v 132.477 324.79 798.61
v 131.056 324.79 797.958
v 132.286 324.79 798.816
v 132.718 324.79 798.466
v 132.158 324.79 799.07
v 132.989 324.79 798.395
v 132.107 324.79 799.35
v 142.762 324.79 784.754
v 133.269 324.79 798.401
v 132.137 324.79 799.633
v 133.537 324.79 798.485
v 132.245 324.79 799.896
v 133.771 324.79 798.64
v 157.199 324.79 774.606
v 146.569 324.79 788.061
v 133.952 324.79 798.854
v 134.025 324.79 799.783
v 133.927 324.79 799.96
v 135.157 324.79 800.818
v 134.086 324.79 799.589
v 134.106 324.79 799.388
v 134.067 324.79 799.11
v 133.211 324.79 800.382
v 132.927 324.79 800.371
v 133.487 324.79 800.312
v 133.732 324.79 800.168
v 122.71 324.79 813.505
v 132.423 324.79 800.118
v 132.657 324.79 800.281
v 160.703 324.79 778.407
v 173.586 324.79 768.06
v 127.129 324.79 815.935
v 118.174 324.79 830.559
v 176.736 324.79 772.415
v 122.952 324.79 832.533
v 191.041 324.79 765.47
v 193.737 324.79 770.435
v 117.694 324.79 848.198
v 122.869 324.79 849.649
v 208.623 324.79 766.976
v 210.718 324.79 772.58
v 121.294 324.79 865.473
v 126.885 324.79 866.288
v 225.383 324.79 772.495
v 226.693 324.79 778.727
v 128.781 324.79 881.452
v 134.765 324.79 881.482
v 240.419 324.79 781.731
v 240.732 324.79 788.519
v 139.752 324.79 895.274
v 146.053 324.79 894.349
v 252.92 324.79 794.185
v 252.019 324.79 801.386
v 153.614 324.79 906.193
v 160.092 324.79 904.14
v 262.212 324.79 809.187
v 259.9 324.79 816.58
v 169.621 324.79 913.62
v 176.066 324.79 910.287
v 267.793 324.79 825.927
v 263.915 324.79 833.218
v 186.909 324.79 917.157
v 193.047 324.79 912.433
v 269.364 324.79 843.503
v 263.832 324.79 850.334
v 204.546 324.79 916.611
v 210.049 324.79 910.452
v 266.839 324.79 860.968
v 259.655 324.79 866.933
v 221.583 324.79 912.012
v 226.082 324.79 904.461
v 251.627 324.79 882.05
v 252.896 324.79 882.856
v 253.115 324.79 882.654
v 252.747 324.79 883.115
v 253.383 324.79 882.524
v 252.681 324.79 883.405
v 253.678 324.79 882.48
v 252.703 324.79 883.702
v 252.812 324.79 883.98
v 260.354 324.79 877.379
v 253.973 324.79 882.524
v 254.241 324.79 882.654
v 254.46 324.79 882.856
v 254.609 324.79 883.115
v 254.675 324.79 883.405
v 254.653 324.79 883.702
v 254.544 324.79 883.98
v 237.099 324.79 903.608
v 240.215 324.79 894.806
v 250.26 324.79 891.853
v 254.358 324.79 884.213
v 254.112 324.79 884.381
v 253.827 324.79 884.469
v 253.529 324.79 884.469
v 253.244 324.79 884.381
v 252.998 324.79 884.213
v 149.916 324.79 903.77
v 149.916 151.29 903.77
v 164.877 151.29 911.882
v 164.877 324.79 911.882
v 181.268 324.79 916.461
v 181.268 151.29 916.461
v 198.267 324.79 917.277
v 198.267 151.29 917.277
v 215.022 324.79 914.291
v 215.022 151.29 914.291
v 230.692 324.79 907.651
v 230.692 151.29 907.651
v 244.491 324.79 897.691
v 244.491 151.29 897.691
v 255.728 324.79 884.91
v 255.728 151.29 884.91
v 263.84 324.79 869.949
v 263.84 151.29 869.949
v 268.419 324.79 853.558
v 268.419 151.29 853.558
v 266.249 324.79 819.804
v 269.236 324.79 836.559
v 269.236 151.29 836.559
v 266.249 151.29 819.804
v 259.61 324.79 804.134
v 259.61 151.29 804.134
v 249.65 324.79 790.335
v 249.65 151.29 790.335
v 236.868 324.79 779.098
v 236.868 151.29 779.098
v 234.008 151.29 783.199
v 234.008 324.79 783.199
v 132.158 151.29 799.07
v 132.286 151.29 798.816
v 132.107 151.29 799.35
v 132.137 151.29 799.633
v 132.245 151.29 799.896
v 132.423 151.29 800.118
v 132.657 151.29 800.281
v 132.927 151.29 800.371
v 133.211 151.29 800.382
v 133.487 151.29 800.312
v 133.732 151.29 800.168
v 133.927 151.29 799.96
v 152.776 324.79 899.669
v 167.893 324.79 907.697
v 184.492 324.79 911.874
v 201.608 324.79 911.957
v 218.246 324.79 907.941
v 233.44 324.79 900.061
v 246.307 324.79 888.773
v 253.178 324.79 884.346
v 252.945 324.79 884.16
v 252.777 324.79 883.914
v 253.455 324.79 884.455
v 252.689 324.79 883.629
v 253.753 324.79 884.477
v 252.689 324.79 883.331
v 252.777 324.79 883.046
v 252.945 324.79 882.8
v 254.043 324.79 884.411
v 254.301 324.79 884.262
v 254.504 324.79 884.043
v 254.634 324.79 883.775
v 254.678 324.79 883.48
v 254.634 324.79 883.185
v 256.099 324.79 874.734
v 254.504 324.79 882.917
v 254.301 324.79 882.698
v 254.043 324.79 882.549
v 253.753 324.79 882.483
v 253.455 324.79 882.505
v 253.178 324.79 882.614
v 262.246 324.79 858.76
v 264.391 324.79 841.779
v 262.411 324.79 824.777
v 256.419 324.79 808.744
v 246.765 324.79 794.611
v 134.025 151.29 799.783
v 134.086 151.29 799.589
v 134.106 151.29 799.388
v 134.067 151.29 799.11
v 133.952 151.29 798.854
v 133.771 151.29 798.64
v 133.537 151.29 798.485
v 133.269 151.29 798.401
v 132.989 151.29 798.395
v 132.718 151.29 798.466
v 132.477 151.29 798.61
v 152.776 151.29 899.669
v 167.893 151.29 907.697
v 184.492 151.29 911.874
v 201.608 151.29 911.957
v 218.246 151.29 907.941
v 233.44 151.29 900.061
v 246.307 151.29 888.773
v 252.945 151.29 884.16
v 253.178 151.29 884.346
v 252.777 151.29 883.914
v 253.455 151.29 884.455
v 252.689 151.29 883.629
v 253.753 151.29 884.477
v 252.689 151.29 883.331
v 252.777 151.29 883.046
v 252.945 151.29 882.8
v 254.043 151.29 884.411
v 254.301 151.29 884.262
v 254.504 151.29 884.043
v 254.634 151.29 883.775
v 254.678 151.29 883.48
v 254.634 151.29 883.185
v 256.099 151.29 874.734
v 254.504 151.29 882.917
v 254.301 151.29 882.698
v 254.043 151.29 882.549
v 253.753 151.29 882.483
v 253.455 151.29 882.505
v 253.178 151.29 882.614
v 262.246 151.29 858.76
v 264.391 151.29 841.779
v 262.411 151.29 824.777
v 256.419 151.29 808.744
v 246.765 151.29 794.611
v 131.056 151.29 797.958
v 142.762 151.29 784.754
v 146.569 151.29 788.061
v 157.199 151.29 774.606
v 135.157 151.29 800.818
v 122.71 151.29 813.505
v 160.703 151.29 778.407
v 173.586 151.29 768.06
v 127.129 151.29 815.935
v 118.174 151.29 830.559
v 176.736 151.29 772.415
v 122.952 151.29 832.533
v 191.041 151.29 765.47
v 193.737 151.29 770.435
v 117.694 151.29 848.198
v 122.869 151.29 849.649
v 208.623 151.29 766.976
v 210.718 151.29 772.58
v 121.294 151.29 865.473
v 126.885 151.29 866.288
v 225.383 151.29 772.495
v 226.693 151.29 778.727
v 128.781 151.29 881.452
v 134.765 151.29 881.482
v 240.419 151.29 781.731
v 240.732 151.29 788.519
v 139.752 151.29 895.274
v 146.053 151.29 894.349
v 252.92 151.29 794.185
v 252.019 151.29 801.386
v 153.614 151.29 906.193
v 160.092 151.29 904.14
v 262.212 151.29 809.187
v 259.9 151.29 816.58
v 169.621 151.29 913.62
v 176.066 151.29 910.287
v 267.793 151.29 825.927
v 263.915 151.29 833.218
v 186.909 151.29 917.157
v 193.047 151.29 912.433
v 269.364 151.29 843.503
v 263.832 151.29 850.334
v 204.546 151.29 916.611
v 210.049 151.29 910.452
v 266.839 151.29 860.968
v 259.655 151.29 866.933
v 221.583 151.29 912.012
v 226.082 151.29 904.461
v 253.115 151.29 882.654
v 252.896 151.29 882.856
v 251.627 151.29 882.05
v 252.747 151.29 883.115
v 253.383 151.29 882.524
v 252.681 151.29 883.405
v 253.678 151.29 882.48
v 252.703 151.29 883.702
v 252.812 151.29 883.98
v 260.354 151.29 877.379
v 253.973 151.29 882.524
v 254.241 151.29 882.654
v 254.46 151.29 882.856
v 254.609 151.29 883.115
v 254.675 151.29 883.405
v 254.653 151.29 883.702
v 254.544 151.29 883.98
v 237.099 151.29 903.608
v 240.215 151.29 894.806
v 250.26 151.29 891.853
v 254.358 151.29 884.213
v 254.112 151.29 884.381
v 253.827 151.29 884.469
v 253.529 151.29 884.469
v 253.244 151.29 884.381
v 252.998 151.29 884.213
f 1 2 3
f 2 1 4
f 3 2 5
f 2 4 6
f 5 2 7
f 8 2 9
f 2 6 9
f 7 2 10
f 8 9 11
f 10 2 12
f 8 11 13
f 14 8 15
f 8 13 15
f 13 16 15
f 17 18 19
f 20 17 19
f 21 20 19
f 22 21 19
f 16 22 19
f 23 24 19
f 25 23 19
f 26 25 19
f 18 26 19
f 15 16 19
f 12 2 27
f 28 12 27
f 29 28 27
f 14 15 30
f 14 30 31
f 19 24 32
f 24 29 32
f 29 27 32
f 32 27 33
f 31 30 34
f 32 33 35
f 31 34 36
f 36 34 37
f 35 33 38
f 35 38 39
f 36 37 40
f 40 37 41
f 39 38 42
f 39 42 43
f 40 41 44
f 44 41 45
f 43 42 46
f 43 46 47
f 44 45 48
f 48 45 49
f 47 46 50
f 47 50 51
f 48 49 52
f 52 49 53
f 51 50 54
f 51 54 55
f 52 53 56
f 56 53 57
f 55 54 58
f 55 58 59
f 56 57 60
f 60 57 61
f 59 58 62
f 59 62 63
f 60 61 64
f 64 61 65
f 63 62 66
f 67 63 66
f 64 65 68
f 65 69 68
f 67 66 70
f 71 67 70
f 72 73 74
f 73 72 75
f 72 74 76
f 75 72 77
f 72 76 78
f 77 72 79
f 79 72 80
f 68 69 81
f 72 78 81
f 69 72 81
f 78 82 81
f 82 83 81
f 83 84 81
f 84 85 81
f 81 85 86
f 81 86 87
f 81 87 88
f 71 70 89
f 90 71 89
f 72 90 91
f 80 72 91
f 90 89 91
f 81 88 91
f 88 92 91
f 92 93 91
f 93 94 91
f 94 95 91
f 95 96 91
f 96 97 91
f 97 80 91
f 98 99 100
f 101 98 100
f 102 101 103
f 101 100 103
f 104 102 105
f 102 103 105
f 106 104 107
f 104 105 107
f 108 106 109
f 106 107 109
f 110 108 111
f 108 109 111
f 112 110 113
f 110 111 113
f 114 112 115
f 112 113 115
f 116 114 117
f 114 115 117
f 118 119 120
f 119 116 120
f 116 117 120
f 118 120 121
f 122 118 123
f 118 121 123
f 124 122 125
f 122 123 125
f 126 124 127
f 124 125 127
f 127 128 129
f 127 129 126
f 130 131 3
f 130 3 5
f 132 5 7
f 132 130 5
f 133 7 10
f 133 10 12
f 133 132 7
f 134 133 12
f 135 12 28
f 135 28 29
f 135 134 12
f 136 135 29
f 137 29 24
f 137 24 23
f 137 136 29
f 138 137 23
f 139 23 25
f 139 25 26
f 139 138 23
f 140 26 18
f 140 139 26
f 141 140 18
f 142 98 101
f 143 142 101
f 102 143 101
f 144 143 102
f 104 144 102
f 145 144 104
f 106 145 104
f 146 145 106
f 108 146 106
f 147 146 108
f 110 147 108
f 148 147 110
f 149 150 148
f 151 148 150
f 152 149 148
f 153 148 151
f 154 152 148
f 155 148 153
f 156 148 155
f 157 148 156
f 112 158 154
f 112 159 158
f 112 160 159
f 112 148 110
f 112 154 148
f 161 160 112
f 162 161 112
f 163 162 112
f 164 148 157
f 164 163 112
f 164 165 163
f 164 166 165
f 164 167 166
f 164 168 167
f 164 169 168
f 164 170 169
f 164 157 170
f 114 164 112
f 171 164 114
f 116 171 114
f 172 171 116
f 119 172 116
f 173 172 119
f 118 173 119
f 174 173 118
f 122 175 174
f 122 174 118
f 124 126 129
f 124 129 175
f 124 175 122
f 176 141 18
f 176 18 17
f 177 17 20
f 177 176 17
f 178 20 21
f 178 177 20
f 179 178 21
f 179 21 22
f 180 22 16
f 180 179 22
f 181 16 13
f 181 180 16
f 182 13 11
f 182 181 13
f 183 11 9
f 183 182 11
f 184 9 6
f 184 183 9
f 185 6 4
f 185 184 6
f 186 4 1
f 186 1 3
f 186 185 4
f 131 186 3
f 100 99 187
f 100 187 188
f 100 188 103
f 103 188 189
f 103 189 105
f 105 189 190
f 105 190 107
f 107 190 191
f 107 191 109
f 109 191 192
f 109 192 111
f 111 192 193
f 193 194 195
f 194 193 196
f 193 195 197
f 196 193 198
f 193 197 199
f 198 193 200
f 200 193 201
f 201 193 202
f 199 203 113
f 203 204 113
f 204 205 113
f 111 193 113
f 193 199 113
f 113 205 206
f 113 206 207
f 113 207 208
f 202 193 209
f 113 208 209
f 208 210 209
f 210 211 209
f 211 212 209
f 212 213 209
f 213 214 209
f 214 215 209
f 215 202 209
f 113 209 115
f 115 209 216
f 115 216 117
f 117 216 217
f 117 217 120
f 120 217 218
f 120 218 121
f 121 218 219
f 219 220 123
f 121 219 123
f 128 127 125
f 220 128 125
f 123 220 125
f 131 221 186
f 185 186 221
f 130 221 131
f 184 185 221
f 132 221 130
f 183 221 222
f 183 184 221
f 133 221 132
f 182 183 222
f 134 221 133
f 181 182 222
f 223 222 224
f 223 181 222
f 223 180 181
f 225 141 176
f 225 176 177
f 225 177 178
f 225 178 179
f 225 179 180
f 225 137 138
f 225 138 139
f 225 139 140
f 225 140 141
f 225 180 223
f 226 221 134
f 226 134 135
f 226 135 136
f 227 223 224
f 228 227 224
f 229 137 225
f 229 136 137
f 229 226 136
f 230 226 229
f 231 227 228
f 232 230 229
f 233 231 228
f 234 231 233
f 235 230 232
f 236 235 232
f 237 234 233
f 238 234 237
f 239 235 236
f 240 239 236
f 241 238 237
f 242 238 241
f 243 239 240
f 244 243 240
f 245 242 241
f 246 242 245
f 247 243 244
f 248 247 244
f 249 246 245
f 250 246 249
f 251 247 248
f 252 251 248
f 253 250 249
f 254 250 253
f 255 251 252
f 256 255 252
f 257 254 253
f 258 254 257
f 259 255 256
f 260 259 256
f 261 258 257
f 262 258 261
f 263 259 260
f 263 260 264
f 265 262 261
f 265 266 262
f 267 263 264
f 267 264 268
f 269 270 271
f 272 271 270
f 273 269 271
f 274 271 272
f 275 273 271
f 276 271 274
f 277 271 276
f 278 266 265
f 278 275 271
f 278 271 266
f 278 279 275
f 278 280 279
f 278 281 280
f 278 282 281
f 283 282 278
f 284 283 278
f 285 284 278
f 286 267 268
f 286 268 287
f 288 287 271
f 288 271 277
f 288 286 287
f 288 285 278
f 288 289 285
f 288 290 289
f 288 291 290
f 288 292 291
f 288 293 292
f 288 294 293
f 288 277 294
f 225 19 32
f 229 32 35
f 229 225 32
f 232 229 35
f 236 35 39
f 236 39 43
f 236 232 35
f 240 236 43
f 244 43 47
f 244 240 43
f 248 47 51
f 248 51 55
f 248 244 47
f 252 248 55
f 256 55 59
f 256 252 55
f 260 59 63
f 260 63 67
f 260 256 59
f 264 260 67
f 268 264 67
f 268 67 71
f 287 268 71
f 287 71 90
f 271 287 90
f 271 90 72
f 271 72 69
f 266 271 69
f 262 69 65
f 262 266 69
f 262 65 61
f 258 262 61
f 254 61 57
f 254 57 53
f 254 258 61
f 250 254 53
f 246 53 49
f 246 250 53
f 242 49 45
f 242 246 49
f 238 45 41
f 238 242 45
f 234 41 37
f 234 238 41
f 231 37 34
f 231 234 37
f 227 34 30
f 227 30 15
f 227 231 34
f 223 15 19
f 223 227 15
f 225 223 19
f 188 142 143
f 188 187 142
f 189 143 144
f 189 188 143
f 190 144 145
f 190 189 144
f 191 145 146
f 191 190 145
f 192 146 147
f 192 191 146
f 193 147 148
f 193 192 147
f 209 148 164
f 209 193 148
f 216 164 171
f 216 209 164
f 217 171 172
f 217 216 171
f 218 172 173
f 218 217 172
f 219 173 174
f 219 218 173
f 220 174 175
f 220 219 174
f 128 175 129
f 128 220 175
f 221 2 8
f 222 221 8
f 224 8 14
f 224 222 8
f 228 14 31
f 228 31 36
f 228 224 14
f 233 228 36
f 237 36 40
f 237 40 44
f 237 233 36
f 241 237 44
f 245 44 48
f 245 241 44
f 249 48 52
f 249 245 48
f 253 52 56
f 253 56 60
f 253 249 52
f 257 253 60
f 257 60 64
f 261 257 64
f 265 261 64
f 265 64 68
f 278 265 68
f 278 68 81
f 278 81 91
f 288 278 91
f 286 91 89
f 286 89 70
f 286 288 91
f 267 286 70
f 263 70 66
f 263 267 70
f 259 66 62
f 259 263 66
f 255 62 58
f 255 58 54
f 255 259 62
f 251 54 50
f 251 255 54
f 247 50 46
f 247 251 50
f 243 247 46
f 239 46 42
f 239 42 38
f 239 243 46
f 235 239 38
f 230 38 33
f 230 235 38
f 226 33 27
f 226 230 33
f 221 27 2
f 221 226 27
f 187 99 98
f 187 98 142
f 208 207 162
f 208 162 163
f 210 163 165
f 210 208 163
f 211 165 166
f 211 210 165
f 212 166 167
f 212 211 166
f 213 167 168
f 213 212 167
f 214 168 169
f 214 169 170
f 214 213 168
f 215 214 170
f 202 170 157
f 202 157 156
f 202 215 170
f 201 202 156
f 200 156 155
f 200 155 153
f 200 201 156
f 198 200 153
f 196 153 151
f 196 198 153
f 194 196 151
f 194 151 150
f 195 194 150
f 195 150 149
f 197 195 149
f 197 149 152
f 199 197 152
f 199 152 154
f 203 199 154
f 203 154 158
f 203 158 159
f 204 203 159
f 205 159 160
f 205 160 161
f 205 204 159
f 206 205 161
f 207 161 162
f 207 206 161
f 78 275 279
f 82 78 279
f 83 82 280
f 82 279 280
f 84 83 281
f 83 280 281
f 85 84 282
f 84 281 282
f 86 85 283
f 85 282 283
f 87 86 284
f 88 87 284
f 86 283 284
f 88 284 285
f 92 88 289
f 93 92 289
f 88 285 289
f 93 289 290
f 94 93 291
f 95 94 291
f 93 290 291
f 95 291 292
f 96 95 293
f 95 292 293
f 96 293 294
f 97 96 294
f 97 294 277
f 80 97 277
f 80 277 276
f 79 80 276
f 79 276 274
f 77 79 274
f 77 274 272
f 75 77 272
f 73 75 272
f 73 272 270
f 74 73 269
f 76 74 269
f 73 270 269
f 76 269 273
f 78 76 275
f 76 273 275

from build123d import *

# Parameters (mm, degrees)
SKETCH2_R                   = 1
BOSS_EXTRUDE1_DEPTH         = 173.5
BODY_MOVE_COPY2_START       = 151.289542195
BODY_MOVE_COPY2_OUTLINE_R   = 76
BODY_MOVE_COPY2_OUTLINE_R_2 = 1
BODY_MOVE_COPY2_OUTLINE_R_3 = 71
BODY_MOVE_COPY2_DEPTH       = 173.5
SKETCH9_W                   = 216.594473319
SKETCH9_H                   = 193.225251402
CUT_EXTRUDE2_DEPTH          = 759.638053814


# Read off the part's stored shape, not the designer's step: Body-Move/Copy2
with BuildPart() as part:
    # Sketch2 → Boss-Extrude1 (new body)
    with BuildSketch(Plane.XZ.offset(-151.289542195)):
        with BuildLine():
            ThreePointArc((255.728497138, 884.910071306), (149.915934679, 903.770125014), (131.055880971, 797.957562555))
            ThreePointArc((131.055880971, 797.957562555), (236.86844343, 779.097508847), (255.728497138, 884.910071306))
        make_face()
        with BuildLine():
            ThreePointArc((134.106417421, 799.387702501), (133.406238551, 798.433707066), (132.286202841, 798.815646523))
            ThreePointArc((132.286202841, 798.815646523), (132.534361442, 800.207917082), (133.926632001, 799.95975848))
            ThreePointArc((133.926632001, 799.95975848), (134.060412856, 799.687523631), (134.106417421, 799.387702501))
        make_face(mode=Mode.SUBTRACT)
        with BuildLine():
            ThreePointArc((251.627424238, 882.049791413), (234.008163537, 783.198581747), (135.156953871, 800.817842448))
            ThreePointArc((135.156953871, 800.817842448), (152.776214572, 899.669052114), (251.627424238, 882.049791413))
        make_face(mode=Mode.SUBTRACT)
        with Locations(Location((253.677960688, 883.479931359, 0), (0, 0, 270))):
            Circle(SKETCH2_R, mode=Mode.SUBTRACT)
    extrude(amount=-BOSS_EXTRUDE1_DEPTH)


with BuildPart() as body_2:
    # Body-Move/Copy2 outline → Body-Move/Copy2 (new body)
    with BuildSketch(Plane(origin=(0, 0, 0), x_dir=(1, 0, 0), z_dir=(0, 1, 0)).offset(BODY_MOVE_COPY2_START)):
        with Locations((193.392189054, -841.43381693)):
            Circle(BODY_MOVE_COPY2_OUTLINE_R)
        with Locations((253.677960688, -883.479931359)):
            Circle(BODY_MOVE_COPY2_OUTLINE_R_2, mode=Mode.SUBTRACT)
        with Locations((133.106417421, -799.387702501)):
            Circle(BODY_MOVE_COPY2_OUTLINE_R_2, mode=Mode.SUBTRACT)
        with Locations((193.392189054, -841.43381693)):
            Circle(BODY_MOVE_COPY2_OUTLINE_R_3, mode=Mode.SUBTRACT)
    extrude(amount=BODY_MOVE_COPY2_DEPTH)

    # Sketch9 → Cut-Extrude2 (cut, through all)
    with BuildSketch(Plane(origin=(524.913002616, 0, 366.098858407), x_dir=(0.5720559786237354, 0, -0.8202145800464904), z_dir=(0.8202145800464904, 0, 0.5720559786237354))):
        with Locations((-576.198099642, 233.376121689)):
            Rectangle(SKETCH9_W, SKETCH9_H)
    extrude(amount=-CUT_EXTRUDE2_DEPTH, mode=Mode.SUBTRACT)


solid = Compound([part.part, body_2.part])
